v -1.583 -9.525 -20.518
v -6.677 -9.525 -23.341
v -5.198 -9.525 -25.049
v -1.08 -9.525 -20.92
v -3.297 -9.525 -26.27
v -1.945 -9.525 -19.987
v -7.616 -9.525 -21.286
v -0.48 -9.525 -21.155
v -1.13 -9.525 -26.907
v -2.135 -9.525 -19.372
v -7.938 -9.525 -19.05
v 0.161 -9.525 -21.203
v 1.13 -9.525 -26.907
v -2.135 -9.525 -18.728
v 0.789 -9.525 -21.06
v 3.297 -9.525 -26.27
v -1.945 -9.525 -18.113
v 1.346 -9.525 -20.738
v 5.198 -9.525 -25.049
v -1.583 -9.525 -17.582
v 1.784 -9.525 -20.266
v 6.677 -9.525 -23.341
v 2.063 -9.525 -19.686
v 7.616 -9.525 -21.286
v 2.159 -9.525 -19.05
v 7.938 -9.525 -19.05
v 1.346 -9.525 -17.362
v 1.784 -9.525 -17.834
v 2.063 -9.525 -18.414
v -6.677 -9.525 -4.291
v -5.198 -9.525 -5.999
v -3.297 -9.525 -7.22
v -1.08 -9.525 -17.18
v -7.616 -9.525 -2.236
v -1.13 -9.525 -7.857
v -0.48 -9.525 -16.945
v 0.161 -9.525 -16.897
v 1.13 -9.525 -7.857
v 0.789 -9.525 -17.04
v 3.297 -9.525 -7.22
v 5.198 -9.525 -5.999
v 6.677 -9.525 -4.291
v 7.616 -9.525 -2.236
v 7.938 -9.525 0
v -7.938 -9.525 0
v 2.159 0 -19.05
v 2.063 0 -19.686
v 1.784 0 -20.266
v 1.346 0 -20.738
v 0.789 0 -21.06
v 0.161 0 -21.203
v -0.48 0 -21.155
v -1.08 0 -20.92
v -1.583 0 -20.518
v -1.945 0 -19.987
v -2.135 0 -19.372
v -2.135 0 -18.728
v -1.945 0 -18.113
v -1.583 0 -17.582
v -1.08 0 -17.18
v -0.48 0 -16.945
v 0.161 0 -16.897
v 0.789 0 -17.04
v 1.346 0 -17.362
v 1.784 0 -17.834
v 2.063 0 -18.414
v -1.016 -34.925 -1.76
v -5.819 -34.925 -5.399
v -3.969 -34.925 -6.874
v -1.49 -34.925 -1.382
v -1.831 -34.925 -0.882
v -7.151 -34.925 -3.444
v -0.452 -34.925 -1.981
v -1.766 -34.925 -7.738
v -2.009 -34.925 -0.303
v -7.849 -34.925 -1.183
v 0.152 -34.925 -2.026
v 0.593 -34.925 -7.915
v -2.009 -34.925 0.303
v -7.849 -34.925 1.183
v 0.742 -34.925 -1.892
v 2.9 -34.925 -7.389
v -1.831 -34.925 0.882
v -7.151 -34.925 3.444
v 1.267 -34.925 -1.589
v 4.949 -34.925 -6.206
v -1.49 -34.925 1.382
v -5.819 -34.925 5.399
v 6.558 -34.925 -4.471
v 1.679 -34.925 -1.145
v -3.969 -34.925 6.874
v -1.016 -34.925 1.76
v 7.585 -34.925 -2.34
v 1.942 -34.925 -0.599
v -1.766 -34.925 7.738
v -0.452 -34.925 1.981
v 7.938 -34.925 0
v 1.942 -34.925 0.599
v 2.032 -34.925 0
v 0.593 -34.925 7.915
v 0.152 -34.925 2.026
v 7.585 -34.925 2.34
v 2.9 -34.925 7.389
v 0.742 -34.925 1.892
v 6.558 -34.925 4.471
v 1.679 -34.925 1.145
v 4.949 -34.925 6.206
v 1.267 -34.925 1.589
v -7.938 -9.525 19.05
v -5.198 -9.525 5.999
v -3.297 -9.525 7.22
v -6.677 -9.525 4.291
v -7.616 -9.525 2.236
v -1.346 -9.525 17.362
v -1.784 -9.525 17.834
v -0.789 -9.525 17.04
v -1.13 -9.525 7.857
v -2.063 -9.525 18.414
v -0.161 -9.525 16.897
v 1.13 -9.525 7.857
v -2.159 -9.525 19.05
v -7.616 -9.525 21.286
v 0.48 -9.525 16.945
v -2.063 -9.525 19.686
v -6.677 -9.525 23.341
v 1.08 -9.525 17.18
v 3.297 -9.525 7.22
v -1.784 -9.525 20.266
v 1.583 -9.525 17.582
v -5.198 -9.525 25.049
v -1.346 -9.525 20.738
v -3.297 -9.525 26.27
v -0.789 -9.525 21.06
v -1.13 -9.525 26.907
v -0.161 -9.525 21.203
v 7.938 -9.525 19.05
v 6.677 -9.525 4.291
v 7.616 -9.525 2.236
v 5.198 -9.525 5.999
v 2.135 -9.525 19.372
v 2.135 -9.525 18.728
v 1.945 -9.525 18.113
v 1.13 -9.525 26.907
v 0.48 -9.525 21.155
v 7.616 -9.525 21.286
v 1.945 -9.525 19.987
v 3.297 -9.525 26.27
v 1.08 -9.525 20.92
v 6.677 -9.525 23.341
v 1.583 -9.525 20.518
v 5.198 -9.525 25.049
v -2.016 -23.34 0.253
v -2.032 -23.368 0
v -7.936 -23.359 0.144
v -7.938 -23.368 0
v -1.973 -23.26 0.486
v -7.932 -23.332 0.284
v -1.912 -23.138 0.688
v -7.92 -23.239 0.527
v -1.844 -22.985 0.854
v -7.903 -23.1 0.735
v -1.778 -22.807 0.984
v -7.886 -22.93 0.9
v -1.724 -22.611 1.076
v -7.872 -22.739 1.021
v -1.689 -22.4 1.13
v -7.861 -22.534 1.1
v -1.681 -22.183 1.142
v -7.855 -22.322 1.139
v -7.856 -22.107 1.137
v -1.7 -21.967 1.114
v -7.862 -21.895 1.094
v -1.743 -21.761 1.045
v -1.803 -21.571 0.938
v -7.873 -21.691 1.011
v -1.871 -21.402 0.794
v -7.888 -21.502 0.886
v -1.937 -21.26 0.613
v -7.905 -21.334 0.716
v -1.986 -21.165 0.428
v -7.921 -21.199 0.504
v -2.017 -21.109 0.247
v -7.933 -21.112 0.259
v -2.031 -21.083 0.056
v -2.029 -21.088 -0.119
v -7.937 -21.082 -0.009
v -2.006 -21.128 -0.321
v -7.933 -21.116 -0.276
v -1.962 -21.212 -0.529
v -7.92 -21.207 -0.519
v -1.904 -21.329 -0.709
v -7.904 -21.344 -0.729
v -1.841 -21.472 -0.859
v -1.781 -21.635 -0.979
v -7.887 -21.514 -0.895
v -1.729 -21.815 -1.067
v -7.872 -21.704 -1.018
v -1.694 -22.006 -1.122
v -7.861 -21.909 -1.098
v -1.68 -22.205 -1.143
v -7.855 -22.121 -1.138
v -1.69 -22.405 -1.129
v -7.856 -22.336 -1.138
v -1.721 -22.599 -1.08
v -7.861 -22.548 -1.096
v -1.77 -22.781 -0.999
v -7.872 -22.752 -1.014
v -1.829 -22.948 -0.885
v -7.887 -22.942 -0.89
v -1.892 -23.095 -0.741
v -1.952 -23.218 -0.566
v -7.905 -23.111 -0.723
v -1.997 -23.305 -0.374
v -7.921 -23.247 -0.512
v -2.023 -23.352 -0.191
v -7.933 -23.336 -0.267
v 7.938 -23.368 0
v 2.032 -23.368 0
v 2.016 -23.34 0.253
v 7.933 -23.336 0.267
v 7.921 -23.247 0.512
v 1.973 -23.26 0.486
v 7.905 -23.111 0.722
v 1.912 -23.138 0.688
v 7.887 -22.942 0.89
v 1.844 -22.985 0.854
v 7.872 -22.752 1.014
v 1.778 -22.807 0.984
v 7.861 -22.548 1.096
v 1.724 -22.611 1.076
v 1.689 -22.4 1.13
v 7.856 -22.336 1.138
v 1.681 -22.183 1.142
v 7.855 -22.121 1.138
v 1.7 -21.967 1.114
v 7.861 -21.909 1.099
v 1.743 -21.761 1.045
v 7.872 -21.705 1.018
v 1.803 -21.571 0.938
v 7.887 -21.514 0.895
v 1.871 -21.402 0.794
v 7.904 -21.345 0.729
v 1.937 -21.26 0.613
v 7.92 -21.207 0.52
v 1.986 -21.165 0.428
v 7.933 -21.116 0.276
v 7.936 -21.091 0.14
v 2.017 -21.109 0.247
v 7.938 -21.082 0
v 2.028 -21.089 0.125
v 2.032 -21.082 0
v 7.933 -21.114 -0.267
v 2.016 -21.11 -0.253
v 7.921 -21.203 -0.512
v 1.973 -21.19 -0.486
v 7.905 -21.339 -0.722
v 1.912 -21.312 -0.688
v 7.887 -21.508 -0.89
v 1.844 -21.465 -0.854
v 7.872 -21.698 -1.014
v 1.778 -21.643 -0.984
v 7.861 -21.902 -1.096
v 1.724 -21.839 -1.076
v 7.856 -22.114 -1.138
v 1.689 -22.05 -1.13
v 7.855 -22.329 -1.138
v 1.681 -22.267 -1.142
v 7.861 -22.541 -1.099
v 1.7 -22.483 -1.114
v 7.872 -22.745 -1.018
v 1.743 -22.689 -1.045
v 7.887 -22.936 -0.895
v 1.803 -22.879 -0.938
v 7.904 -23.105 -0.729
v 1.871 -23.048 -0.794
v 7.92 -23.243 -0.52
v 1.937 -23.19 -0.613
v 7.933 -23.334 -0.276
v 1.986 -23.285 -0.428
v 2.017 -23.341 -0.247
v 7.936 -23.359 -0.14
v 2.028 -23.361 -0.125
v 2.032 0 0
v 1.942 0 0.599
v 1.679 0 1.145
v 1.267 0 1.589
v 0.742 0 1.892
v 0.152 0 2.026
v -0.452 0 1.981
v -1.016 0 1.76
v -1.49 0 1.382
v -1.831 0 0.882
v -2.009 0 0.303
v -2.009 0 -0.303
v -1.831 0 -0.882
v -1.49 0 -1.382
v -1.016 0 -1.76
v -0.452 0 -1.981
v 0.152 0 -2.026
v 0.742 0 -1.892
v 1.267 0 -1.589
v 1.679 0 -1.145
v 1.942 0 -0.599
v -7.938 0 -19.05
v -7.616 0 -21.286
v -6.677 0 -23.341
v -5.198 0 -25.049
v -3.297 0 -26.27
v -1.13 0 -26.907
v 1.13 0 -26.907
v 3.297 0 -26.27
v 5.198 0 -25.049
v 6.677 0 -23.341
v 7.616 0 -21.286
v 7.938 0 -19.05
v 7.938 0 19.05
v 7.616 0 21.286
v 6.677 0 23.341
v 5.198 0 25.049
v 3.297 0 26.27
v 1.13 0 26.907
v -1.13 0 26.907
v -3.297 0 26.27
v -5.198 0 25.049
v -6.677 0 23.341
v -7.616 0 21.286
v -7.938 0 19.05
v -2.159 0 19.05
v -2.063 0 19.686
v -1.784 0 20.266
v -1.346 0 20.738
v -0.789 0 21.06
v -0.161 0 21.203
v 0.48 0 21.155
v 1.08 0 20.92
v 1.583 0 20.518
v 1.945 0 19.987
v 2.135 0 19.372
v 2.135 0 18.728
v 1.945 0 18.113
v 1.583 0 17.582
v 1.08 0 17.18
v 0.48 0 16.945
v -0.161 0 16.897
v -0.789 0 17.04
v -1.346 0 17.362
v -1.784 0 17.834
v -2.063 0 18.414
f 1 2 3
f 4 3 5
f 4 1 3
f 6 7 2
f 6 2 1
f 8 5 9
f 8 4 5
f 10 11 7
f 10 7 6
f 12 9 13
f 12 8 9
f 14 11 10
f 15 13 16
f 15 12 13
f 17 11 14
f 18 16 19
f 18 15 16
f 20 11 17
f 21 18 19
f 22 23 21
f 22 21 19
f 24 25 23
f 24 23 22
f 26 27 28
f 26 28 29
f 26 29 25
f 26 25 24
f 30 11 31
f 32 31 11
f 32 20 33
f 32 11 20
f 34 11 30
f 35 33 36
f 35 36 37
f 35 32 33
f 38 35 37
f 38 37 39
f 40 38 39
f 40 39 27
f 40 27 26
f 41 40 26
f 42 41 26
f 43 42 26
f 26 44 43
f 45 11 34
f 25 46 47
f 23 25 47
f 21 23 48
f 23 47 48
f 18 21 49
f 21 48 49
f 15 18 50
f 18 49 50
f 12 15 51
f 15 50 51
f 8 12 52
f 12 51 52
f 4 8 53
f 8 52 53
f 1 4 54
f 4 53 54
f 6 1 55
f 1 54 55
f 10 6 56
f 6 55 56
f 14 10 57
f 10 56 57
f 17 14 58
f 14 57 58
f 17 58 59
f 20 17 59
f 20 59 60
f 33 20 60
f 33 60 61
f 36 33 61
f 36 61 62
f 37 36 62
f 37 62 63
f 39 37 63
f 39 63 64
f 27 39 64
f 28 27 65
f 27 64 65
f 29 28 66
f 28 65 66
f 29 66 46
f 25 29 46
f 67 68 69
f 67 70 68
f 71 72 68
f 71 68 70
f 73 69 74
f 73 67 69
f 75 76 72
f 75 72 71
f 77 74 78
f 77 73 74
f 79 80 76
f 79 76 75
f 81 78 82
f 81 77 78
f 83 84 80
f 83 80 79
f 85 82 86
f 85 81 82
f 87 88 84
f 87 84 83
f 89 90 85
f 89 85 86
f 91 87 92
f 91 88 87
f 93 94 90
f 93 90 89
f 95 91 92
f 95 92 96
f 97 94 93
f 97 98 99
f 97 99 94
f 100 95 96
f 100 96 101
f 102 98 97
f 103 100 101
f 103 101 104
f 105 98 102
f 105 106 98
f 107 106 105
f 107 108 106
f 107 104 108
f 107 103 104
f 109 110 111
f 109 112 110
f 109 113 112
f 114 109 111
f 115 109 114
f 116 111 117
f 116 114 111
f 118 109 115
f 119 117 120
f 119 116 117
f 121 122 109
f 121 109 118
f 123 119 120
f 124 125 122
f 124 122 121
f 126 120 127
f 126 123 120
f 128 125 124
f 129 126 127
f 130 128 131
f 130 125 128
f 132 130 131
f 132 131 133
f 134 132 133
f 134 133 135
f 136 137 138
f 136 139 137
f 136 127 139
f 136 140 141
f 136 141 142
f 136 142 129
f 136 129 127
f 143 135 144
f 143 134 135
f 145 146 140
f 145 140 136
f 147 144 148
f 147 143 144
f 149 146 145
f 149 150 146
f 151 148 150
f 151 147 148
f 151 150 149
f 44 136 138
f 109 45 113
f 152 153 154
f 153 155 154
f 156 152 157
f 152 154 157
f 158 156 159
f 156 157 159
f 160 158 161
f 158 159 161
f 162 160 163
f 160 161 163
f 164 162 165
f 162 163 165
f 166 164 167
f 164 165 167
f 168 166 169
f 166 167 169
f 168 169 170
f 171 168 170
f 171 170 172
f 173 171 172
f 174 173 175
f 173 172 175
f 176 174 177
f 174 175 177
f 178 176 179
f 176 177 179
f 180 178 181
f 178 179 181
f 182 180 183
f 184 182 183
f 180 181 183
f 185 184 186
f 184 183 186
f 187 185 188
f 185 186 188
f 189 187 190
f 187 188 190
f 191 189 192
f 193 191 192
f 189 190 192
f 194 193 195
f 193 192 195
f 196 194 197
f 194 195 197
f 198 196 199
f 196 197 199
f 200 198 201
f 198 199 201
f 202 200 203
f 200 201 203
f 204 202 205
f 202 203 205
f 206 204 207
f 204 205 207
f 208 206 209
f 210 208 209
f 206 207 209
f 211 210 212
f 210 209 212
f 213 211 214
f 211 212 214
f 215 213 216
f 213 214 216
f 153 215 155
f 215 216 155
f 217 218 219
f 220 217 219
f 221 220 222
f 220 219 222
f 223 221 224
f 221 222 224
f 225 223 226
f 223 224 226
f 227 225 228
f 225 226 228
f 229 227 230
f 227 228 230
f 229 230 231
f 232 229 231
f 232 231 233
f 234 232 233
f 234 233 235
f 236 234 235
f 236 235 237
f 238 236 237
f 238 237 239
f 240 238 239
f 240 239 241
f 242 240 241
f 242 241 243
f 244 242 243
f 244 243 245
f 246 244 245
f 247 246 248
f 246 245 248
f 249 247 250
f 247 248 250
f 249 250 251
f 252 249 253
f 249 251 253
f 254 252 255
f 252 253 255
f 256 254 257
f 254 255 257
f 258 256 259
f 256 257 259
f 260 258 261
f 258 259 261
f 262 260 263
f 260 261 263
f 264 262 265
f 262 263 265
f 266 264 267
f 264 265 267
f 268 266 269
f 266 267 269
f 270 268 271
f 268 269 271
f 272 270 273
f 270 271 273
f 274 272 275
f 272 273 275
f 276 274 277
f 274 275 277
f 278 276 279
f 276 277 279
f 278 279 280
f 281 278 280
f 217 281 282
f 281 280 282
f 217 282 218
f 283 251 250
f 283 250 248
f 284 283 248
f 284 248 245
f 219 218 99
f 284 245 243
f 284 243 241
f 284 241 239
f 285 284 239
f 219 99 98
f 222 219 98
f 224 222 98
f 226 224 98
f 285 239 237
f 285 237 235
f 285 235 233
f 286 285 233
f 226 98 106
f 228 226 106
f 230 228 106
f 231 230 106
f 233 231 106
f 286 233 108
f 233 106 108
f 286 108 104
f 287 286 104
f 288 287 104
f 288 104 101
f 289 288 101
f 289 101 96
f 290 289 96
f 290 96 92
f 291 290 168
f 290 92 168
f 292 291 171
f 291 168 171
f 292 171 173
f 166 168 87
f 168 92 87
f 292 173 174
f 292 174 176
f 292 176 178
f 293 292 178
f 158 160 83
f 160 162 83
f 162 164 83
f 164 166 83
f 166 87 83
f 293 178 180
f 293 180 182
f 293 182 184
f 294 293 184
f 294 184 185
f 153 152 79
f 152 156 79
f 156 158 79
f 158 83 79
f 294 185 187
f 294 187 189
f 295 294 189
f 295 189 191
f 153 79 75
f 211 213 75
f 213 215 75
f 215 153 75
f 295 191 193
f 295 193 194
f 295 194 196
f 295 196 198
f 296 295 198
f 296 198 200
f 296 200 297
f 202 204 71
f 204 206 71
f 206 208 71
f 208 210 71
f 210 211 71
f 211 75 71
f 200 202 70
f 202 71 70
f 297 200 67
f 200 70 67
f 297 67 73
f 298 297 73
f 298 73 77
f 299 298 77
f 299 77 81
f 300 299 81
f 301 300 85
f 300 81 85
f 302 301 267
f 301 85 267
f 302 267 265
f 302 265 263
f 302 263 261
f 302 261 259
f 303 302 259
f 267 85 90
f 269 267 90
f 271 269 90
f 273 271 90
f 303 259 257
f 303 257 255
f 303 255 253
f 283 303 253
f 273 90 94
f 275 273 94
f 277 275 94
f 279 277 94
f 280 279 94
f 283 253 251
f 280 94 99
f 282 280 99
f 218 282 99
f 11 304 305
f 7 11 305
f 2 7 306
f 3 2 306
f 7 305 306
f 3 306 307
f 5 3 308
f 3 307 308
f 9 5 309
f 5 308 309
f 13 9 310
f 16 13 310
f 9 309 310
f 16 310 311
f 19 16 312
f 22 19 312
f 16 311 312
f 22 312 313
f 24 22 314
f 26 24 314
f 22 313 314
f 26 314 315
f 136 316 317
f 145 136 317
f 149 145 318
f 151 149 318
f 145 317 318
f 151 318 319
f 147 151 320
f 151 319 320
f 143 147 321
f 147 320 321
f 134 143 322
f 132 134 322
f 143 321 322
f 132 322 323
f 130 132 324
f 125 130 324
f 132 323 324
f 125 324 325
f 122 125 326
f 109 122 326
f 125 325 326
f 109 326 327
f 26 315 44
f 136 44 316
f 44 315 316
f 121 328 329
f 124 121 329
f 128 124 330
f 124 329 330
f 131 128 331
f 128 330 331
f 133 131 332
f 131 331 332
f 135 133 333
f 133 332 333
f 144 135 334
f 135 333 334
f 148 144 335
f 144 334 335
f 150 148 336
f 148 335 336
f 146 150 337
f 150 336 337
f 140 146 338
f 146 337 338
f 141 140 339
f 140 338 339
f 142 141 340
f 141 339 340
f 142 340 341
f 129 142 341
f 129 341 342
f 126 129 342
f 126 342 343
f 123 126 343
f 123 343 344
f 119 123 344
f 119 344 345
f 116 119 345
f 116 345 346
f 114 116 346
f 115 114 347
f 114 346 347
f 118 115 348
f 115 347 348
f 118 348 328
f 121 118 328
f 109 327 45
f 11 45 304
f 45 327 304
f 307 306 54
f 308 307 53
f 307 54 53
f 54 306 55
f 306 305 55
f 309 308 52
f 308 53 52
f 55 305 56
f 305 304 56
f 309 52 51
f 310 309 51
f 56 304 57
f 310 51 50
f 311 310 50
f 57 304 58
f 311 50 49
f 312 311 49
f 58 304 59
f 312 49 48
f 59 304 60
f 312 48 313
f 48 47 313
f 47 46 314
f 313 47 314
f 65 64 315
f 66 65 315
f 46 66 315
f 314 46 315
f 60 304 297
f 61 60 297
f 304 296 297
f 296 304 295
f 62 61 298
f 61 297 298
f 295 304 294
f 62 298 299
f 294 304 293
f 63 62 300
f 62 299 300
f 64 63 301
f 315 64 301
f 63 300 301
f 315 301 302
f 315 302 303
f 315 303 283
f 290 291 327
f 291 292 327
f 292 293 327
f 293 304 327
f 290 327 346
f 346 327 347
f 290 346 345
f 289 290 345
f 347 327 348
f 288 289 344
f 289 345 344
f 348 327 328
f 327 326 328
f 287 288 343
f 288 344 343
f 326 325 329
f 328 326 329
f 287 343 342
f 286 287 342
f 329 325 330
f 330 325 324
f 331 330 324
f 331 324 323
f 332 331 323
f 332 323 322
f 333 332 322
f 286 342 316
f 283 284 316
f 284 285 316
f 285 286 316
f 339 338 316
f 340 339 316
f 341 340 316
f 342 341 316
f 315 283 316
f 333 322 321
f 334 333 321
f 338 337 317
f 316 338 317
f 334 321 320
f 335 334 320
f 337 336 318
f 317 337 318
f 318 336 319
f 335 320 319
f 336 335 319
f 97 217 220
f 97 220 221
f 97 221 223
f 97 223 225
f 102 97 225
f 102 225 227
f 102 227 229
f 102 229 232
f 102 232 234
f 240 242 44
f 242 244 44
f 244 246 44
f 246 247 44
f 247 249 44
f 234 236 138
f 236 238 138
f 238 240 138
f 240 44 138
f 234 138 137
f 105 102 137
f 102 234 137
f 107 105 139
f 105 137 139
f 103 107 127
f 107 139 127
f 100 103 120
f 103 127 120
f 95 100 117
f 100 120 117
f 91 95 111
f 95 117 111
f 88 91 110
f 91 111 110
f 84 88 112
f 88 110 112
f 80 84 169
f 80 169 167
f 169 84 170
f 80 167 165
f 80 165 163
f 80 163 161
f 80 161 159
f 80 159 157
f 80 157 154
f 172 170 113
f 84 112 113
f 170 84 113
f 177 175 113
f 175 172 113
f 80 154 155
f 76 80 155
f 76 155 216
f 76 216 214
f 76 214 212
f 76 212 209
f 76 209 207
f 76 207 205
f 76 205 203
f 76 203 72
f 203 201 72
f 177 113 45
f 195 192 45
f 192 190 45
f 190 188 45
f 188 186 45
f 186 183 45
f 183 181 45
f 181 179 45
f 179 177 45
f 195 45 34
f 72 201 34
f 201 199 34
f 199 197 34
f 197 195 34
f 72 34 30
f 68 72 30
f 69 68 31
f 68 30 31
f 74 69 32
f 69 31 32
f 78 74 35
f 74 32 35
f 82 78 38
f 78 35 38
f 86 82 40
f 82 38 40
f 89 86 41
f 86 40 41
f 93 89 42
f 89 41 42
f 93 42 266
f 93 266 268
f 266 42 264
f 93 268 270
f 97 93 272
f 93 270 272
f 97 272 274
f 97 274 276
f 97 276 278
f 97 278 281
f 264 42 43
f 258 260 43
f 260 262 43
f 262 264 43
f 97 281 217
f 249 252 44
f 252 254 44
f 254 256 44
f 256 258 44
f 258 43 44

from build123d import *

# Parameters (mm, degrees)
F1_DEPTH = 9.525
F2_R     = 7.9375
F3_DEPTH = 25.4
F4_R     = 2.032
F5_DEPTH = 34.926
F6_R     = 1.143
F7_DEPTH = 25.4


with BuildPart() as f1:
    # F0 (on Front) → F1 (new body)
    with BuildSketch(Plane.XZ):
        with BuildLine():
            Line((7.9375, -19.05), (7.9375, 19.05))
            Line((7.9375, 19.05), (2.159, 19.05))
            ThreePointArc((2.159, 19.05), (0, 16.891), (-2.159, 19.05))
            Line((-2.159, 19.05), (-7.9375, 19.05))
            Line((-7.9375, 19.05), (-7.9375, -19.05))
            Line((-7.9375, -19.05), (-2.159, -19.05))
            ThreePointArc((-2.159, -19.05), (0, -16.891), (2.159, -19.05))
            Line((2.159, -19.05), (7.9375, -19.05))
        make_face()
        with BuildLine():
            Line((2.159, 19.05), (7.9375, 19.05))
            ThreePointArc((7.9375, 19.05), (0, 26.9875), (-7.9375, 19.05))
            Line((-7.9375, 19.05), (-2.159, 19.05))
            ThreePointArc((-2.159, 19.05), (0, 21.209), (2.159, 19.05))
        make_face()
        with BuildLine():
            ThreePointArc((-7.9375, -19.05), (0, -26.9875), (7.9375, -19.05))
            Line((7.9375, -19.05), (2.159, -19.05))
            ThreePointArc((2.159, -19.05), (0, -21.209), (-2.159, -19.05))
            Line((-2.159, -19.05), (-7.9375, -19.05))
        make_face()
    extrude(amount=F1_DEPTH)

    # F2 (on face) → F3 (join)
    with BuildSketch(Plane.XZ.offset(9.525)):
        Circle(F2_R)
    extrude(amount=F3_DEPTH)

    # F4 (on face) → F5 (cut, through all)
    with BuildSketch(Plane.XZ.offset(34.925)):
        Circle(F4_R)
    extrude(amount=-F5_DEPTH, mode=Mode.SUBTRACT)

    # F6 (on face) → F7 (cut)
    with BuildSketch(Plane(origin=(-7.9375, 0, 0), x_dir=(0, -1, 0), z_dir=(-1, 0, 0))):
        with Locations((22.225, 0)):
            Circle(F6_R)
    extrude(amount=-F7_DEPTH, mode=Mode.SUBTRACT)


solid = f1.part
